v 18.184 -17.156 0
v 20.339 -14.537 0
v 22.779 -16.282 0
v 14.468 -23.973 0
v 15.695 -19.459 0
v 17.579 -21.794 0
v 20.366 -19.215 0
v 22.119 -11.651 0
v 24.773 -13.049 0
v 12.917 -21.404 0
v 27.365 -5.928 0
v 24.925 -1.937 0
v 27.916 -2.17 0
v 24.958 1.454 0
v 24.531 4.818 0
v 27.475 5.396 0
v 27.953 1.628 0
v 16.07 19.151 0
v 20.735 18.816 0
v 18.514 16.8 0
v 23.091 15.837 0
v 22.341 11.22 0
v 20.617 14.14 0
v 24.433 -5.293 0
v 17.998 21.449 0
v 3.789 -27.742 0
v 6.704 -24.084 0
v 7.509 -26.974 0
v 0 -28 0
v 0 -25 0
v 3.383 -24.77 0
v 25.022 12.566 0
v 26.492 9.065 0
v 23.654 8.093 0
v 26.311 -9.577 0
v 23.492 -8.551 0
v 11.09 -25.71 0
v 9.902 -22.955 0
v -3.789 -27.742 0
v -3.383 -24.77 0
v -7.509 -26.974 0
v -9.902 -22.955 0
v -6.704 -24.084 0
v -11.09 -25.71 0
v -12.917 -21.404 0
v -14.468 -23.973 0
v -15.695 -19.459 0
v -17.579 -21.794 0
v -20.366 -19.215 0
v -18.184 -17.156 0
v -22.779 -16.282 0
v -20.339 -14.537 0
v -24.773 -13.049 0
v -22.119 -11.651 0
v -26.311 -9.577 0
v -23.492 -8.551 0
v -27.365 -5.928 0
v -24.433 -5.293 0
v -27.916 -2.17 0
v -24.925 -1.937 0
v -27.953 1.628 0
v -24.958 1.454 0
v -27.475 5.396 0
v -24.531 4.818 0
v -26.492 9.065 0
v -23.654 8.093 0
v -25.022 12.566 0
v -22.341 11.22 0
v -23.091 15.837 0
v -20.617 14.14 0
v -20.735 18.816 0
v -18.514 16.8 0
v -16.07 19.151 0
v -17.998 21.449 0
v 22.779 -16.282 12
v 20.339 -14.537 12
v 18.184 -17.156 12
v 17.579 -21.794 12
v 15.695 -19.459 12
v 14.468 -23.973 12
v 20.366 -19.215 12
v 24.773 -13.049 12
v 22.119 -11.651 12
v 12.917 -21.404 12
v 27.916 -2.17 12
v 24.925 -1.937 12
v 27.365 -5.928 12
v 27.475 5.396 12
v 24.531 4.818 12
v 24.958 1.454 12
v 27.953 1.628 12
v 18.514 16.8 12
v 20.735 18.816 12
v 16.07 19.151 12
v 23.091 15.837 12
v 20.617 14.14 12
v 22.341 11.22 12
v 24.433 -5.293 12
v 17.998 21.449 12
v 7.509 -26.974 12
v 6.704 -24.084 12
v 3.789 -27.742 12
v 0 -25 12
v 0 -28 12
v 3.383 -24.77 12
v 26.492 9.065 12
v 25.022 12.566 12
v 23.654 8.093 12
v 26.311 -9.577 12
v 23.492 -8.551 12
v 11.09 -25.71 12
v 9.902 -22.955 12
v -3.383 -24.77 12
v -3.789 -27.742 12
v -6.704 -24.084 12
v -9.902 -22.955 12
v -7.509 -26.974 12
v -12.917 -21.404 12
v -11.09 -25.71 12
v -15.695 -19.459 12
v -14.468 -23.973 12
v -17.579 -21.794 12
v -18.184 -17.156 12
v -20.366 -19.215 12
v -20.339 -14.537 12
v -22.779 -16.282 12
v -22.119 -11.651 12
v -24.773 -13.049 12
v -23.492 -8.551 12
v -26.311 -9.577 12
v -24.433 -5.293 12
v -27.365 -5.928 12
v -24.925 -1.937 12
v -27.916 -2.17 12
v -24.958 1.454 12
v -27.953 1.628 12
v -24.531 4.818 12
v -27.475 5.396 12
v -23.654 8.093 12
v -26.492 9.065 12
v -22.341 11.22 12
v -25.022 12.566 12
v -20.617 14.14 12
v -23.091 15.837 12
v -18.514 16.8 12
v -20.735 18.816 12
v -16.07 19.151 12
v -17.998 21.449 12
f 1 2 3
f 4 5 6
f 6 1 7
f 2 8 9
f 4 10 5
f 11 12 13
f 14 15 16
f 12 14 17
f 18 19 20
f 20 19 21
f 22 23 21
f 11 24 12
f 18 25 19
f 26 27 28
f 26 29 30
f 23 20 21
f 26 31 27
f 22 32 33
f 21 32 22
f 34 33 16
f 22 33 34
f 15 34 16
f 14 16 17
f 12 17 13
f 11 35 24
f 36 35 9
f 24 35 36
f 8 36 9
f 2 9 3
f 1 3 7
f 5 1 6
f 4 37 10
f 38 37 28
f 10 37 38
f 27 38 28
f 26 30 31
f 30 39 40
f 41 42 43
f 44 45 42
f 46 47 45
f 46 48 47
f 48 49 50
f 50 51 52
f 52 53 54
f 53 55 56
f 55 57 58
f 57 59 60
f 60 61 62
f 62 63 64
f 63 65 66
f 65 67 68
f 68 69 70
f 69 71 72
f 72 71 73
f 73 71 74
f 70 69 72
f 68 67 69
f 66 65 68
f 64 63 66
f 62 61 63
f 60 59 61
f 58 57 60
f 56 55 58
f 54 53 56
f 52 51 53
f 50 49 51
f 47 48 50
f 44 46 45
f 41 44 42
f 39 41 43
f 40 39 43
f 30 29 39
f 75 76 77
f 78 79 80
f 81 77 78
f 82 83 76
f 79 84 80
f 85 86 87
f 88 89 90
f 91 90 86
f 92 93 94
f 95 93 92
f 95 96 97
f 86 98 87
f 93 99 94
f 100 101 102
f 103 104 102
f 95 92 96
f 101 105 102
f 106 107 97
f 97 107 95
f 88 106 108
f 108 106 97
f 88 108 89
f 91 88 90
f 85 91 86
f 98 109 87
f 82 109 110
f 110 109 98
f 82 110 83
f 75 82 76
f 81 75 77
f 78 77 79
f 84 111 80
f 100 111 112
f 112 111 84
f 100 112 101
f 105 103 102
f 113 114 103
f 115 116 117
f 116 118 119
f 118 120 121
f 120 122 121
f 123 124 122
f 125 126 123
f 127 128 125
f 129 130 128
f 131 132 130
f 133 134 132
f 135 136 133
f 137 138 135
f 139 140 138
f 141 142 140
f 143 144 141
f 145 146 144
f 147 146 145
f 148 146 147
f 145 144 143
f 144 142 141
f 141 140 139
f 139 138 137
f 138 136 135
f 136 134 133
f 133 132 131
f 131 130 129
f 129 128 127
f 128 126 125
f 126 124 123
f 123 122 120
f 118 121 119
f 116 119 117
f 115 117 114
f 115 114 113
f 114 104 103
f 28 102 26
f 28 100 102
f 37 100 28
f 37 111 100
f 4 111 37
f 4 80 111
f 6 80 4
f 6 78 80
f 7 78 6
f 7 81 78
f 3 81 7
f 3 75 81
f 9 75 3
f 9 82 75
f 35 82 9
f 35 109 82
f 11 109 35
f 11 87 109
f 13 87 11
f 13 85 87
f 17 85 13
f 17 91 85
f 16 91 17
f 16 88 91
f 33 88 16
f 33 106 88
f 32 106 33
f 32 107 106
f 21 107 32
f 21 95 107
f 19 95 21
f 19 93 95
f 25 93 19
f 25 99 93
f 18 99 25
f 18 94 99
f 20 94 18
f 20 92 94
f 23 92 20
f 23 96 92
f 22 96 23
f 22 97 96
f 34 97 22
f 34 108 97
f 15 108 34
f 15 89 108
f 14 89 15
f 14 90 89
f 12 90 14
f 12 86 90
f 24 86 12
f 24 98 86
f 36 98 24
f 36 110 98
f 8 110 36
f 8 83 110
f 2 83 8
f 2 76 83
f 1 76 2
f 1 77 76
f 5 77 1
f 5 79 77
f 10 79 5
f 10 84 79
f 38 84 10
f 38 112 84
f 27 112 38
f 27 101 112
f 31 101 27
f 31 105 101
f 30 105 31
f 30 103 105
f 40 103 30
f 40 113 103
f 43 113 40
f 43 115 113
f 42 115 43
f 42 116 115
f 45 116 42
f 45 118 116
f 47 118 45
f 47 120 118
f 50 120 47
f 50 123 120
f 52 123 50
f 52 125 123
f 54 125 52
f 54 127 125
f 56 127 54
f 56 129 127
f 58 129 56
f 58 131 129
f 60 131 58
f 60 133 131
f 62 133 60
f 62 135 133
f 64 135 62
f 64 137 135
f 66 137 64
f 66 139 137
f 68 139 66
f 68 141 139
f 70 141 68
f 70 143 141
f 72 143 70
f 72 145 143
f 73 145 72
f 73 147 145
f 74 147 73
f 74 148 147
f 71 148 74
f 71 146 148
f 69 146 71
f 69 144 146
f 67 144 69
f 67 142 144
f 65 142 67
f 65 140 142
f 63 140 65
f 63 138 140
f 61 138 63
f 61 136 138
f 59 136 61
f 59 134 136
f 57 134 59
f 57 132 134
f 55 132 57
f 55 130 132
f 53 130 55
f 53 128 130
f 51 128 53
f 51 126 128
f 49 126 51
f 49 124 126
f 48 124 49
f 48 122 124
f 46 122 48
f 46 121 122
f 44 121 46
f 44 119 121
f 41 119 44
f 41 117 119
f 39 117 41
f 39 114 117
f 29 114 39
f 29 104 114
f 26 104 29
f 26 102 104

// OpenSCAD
$fn = 32;

// ----------------------------------------------------------------------
// Spring clip: 56 mm outside, 3 mm band, 80 degree opening
// ----------------------------------------------------------------------

// --- parameters (mm) ---
outer_r = 28;             // clip outside radius
inner_r = 25;             // clip bore radius
band = 3;                 // band thickness
clip_w = 12;              // clip width
opening = 80;             // opening angle

clip_profile = [[-17.998, 21.449], [-20.735, 18.816], [-23.091, 15.837], [-25.022, 12.566], [-26.492, 9.065], [-27.475, 5.396], [-27.953, 1.628], [-27.916, -2.17], [-27.365, -5.928], [-26.311, -9.577], [-24.773, -13.049], [-22.779, -16.282], [-20.366, -19.215], [-17.579, -21.794], [-14.468, -23.973], [-11.09, -25.71], [-7.509, -26.974], [-3.789, -27.742], [0, -28], [3.789, -27.742], [7.509, -26.974], [11.09, -25.71], [14.468, -23.973], [17.579, -21.794], [20.366, -19.215], [22.779, -16.282], [24.773, -13.049], [26.311, -9.577], [27.365, -5.928], [27.916, -2.17], [27.953, 1.628], [27.475, 5.396], [26.492, 9.065], [25.022, 12.566], [23.091, 15.837], [20.735, 18.816], [17.998, 21.449], [16.07, 19.151], [18.514, 16.8], [20.617, 14.14], [22.341, 11.22], [23.654, 8.093], [24.531, 4.818], [24.958, 1.454], [24.925, -1.937], [24.433, -5.293], [23.492, -8.551], [22.119, -11.651], [20.339, -14.537], [18.184, -17.156], [15.695, -19.459], [12.917, -21.404], [9.902, -22.955], [6.704, -24.084], [3.383, -24.77], [0, -25], [-3.383, -24.77], [-6.704, -24.084], [-9.902, -22.955], [-12.917, -21.404], [-15.695, -19.459], [-18.184, -17.156], [-20.339, -14.537], [-22.119, -11.651], [-23.492, -8.551], [-24.433, -5.293], [-24.925, -1.937], [-24.958, 1.454], [-24.531, 4.818], [-23.654, 8.093], [-22.341, 11.22], [-20.617, 14.14], [-18.514, 16.8], [-16.07, 19.151]];

difference() {
  union() {
    linear_extrude(height = clip_w) polygon(clip_profile);
  }
}
